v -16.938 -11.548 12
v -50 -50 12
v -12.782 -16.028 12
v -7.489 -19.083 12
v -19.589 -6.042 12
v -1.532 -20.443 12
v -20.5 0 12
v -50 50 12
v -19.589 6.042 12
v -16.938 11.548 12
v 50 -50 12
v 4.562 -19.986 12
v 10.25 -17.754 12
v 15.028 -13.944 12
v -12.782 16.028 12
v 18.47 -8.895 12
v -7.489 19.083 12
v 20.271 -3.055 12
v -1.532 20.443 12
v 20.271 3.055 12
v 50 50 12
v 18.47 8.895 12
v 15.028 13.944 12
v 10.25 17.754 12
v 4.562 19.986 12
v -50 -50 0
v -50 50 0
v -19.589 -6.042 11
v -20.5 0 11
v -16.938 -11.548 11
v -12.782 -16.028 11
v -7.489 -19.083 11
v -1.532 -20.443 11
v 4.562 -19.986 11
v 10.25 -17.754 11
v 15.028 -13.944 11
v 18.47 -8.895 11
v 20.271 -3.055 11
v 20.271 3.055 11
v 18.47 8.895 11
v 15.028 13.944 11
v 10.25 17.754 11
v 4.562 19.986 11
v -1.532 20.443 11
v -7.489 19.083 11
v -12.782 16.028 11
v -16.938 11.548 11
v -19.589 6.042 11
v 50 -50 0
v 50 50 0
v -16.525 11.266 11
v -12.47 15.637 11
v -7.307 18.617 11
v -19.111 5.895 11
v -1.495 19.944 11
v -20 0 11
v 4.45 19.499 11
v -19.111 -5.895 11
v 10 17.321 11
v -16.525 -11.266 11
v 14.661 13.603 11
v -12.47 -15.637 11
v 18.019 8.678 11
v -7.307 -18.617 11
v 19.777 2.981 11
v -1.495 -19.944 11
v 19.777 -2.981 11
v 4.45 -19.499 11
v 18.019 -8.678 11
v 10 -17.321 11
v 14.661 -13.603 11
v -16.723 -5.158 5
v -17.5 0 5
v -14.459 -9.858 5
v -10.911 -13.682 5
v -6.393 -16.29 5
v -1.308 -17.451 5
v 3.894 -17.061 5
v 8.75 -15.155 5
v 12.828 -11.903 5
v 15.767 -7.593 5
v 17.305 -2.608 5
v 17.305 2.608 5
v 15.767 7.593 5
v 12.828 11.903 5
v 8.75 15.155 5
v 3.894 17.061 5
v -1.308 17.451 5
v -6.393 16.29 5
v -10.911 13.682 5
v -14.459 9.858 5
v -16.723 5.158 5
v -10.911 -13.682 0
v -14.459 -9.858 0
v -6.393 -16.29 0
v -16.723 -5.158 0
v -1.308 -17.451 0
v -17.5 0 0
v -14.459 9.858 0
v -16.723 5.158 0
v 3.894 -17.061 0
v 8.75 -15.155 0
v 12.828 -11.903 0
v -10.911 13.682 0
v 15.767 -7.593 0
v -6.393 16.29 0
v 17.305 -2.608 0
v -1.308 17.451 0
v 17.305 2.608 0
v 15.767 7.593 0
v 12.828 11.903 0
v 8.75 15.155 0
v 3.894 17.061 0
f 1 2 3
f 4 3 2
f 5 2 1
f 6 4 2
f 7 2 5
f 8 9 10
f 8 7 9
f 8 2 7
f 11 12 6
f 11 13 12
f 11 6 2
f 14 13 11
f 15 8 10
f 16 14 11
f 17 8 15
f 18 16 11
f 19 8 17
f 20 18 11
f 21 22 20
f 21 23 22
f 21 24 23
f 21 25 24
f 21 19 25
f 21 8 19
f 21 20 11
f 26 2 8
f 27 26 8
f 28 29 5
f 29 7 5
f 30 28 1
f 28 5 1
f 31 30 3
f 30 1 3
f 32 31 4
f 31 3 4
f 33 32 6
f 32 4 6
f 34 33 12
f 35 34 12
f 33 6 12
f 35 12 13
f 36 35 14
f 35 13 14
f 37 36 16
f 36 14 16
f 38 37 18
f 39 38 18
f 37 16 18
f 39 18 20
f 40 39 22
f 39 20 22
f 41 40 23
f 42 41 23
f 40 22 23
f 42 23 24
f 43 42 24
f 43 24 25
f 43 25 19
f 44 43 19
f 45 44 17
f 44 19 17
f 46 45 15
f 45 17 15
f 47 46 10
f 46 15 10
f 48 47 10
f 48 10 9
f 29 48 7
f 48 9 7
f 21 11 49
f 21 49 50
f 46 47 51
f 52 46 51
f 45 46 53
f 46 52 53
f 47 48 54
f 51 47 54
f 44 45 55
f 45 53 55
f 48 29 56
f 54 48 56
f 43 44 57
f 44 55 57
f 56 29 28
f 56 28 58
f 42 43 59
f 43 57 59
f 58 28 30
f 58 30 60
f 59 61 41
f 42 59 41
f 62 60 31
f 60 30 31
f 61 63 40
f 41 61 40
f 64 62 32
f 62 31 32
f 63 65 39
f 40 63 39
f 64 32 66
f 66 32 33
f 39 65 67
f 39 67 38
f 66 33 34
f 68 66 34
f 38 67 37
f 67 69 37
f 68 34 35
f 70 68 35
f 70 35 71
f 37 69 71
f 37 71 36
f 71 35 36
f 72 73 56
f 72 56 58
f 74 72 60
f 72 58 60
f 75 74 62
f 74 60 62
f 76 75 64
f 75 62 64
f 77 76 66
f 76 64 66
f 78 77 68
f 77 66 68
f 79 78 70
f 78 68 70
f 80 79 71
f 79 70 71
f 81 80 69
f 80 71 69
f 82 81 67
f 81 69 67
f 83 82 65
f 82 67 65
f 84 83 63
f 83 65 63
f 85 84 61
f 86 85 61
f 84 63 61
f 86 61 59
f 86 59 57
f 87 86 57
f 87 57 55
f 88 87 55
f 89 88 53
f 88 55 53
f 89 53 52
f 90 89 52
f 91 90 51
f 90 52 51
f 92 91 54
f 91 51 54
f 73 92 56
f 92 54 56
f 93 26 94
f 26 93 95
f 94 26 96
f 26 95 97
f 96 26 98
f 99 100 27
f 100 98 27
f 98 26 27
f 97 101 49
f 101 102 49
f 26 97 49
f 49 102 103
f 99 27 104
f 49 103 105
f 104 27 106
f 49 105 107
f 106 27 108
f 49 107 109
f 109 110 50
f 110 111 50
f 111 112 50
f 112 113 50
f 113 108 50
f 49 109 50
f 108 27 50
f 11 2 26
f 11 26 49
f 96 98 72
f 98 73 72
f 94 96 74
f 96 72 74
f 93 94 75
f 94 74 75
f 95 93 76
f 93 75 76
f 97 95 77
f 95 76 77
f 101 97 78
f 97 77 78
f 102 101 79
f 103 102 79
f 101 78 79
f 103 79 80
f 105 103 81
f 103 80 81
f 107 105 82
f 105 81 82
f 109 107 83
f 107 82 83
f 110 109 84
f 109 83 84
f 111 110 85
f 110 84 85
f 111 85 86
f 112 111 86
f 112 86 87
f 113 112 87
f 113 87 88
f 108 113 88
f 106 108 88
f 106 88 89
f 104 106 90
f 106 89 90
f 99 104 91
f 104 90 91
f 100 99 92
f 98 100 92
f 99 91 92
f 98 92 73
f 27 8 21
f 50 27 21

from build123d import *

# Parameters (mm, degrees)
F2_W     = 100
F2_H     = 100
F2_R     = 40
F3_DEPTH = 12


with BuildPart() as f1:
    # F0 (on Front) → F1 (revolve)
    with BuildSketch(Plane.XZ):
        Polygon((-40, 0), (-17.5, 0), (-17.5, 5), (-20, 11), (-20.5, 11), (-20.5, 12), (-40, 12), align=None)
    revolve(axis=Axis((0, 0, 25.371263), (0, 0, 1)))

    # F2 (on face) → F3 (join)
    with BuildSketch(Plane.XY.offset(12)):
        Rectangle(F2_W, F2_H)
        Circle(F2_R, mode=Mode.SUBTRACT)
    extrude(amount=-F3_DEPTH)


solid = f1.part
